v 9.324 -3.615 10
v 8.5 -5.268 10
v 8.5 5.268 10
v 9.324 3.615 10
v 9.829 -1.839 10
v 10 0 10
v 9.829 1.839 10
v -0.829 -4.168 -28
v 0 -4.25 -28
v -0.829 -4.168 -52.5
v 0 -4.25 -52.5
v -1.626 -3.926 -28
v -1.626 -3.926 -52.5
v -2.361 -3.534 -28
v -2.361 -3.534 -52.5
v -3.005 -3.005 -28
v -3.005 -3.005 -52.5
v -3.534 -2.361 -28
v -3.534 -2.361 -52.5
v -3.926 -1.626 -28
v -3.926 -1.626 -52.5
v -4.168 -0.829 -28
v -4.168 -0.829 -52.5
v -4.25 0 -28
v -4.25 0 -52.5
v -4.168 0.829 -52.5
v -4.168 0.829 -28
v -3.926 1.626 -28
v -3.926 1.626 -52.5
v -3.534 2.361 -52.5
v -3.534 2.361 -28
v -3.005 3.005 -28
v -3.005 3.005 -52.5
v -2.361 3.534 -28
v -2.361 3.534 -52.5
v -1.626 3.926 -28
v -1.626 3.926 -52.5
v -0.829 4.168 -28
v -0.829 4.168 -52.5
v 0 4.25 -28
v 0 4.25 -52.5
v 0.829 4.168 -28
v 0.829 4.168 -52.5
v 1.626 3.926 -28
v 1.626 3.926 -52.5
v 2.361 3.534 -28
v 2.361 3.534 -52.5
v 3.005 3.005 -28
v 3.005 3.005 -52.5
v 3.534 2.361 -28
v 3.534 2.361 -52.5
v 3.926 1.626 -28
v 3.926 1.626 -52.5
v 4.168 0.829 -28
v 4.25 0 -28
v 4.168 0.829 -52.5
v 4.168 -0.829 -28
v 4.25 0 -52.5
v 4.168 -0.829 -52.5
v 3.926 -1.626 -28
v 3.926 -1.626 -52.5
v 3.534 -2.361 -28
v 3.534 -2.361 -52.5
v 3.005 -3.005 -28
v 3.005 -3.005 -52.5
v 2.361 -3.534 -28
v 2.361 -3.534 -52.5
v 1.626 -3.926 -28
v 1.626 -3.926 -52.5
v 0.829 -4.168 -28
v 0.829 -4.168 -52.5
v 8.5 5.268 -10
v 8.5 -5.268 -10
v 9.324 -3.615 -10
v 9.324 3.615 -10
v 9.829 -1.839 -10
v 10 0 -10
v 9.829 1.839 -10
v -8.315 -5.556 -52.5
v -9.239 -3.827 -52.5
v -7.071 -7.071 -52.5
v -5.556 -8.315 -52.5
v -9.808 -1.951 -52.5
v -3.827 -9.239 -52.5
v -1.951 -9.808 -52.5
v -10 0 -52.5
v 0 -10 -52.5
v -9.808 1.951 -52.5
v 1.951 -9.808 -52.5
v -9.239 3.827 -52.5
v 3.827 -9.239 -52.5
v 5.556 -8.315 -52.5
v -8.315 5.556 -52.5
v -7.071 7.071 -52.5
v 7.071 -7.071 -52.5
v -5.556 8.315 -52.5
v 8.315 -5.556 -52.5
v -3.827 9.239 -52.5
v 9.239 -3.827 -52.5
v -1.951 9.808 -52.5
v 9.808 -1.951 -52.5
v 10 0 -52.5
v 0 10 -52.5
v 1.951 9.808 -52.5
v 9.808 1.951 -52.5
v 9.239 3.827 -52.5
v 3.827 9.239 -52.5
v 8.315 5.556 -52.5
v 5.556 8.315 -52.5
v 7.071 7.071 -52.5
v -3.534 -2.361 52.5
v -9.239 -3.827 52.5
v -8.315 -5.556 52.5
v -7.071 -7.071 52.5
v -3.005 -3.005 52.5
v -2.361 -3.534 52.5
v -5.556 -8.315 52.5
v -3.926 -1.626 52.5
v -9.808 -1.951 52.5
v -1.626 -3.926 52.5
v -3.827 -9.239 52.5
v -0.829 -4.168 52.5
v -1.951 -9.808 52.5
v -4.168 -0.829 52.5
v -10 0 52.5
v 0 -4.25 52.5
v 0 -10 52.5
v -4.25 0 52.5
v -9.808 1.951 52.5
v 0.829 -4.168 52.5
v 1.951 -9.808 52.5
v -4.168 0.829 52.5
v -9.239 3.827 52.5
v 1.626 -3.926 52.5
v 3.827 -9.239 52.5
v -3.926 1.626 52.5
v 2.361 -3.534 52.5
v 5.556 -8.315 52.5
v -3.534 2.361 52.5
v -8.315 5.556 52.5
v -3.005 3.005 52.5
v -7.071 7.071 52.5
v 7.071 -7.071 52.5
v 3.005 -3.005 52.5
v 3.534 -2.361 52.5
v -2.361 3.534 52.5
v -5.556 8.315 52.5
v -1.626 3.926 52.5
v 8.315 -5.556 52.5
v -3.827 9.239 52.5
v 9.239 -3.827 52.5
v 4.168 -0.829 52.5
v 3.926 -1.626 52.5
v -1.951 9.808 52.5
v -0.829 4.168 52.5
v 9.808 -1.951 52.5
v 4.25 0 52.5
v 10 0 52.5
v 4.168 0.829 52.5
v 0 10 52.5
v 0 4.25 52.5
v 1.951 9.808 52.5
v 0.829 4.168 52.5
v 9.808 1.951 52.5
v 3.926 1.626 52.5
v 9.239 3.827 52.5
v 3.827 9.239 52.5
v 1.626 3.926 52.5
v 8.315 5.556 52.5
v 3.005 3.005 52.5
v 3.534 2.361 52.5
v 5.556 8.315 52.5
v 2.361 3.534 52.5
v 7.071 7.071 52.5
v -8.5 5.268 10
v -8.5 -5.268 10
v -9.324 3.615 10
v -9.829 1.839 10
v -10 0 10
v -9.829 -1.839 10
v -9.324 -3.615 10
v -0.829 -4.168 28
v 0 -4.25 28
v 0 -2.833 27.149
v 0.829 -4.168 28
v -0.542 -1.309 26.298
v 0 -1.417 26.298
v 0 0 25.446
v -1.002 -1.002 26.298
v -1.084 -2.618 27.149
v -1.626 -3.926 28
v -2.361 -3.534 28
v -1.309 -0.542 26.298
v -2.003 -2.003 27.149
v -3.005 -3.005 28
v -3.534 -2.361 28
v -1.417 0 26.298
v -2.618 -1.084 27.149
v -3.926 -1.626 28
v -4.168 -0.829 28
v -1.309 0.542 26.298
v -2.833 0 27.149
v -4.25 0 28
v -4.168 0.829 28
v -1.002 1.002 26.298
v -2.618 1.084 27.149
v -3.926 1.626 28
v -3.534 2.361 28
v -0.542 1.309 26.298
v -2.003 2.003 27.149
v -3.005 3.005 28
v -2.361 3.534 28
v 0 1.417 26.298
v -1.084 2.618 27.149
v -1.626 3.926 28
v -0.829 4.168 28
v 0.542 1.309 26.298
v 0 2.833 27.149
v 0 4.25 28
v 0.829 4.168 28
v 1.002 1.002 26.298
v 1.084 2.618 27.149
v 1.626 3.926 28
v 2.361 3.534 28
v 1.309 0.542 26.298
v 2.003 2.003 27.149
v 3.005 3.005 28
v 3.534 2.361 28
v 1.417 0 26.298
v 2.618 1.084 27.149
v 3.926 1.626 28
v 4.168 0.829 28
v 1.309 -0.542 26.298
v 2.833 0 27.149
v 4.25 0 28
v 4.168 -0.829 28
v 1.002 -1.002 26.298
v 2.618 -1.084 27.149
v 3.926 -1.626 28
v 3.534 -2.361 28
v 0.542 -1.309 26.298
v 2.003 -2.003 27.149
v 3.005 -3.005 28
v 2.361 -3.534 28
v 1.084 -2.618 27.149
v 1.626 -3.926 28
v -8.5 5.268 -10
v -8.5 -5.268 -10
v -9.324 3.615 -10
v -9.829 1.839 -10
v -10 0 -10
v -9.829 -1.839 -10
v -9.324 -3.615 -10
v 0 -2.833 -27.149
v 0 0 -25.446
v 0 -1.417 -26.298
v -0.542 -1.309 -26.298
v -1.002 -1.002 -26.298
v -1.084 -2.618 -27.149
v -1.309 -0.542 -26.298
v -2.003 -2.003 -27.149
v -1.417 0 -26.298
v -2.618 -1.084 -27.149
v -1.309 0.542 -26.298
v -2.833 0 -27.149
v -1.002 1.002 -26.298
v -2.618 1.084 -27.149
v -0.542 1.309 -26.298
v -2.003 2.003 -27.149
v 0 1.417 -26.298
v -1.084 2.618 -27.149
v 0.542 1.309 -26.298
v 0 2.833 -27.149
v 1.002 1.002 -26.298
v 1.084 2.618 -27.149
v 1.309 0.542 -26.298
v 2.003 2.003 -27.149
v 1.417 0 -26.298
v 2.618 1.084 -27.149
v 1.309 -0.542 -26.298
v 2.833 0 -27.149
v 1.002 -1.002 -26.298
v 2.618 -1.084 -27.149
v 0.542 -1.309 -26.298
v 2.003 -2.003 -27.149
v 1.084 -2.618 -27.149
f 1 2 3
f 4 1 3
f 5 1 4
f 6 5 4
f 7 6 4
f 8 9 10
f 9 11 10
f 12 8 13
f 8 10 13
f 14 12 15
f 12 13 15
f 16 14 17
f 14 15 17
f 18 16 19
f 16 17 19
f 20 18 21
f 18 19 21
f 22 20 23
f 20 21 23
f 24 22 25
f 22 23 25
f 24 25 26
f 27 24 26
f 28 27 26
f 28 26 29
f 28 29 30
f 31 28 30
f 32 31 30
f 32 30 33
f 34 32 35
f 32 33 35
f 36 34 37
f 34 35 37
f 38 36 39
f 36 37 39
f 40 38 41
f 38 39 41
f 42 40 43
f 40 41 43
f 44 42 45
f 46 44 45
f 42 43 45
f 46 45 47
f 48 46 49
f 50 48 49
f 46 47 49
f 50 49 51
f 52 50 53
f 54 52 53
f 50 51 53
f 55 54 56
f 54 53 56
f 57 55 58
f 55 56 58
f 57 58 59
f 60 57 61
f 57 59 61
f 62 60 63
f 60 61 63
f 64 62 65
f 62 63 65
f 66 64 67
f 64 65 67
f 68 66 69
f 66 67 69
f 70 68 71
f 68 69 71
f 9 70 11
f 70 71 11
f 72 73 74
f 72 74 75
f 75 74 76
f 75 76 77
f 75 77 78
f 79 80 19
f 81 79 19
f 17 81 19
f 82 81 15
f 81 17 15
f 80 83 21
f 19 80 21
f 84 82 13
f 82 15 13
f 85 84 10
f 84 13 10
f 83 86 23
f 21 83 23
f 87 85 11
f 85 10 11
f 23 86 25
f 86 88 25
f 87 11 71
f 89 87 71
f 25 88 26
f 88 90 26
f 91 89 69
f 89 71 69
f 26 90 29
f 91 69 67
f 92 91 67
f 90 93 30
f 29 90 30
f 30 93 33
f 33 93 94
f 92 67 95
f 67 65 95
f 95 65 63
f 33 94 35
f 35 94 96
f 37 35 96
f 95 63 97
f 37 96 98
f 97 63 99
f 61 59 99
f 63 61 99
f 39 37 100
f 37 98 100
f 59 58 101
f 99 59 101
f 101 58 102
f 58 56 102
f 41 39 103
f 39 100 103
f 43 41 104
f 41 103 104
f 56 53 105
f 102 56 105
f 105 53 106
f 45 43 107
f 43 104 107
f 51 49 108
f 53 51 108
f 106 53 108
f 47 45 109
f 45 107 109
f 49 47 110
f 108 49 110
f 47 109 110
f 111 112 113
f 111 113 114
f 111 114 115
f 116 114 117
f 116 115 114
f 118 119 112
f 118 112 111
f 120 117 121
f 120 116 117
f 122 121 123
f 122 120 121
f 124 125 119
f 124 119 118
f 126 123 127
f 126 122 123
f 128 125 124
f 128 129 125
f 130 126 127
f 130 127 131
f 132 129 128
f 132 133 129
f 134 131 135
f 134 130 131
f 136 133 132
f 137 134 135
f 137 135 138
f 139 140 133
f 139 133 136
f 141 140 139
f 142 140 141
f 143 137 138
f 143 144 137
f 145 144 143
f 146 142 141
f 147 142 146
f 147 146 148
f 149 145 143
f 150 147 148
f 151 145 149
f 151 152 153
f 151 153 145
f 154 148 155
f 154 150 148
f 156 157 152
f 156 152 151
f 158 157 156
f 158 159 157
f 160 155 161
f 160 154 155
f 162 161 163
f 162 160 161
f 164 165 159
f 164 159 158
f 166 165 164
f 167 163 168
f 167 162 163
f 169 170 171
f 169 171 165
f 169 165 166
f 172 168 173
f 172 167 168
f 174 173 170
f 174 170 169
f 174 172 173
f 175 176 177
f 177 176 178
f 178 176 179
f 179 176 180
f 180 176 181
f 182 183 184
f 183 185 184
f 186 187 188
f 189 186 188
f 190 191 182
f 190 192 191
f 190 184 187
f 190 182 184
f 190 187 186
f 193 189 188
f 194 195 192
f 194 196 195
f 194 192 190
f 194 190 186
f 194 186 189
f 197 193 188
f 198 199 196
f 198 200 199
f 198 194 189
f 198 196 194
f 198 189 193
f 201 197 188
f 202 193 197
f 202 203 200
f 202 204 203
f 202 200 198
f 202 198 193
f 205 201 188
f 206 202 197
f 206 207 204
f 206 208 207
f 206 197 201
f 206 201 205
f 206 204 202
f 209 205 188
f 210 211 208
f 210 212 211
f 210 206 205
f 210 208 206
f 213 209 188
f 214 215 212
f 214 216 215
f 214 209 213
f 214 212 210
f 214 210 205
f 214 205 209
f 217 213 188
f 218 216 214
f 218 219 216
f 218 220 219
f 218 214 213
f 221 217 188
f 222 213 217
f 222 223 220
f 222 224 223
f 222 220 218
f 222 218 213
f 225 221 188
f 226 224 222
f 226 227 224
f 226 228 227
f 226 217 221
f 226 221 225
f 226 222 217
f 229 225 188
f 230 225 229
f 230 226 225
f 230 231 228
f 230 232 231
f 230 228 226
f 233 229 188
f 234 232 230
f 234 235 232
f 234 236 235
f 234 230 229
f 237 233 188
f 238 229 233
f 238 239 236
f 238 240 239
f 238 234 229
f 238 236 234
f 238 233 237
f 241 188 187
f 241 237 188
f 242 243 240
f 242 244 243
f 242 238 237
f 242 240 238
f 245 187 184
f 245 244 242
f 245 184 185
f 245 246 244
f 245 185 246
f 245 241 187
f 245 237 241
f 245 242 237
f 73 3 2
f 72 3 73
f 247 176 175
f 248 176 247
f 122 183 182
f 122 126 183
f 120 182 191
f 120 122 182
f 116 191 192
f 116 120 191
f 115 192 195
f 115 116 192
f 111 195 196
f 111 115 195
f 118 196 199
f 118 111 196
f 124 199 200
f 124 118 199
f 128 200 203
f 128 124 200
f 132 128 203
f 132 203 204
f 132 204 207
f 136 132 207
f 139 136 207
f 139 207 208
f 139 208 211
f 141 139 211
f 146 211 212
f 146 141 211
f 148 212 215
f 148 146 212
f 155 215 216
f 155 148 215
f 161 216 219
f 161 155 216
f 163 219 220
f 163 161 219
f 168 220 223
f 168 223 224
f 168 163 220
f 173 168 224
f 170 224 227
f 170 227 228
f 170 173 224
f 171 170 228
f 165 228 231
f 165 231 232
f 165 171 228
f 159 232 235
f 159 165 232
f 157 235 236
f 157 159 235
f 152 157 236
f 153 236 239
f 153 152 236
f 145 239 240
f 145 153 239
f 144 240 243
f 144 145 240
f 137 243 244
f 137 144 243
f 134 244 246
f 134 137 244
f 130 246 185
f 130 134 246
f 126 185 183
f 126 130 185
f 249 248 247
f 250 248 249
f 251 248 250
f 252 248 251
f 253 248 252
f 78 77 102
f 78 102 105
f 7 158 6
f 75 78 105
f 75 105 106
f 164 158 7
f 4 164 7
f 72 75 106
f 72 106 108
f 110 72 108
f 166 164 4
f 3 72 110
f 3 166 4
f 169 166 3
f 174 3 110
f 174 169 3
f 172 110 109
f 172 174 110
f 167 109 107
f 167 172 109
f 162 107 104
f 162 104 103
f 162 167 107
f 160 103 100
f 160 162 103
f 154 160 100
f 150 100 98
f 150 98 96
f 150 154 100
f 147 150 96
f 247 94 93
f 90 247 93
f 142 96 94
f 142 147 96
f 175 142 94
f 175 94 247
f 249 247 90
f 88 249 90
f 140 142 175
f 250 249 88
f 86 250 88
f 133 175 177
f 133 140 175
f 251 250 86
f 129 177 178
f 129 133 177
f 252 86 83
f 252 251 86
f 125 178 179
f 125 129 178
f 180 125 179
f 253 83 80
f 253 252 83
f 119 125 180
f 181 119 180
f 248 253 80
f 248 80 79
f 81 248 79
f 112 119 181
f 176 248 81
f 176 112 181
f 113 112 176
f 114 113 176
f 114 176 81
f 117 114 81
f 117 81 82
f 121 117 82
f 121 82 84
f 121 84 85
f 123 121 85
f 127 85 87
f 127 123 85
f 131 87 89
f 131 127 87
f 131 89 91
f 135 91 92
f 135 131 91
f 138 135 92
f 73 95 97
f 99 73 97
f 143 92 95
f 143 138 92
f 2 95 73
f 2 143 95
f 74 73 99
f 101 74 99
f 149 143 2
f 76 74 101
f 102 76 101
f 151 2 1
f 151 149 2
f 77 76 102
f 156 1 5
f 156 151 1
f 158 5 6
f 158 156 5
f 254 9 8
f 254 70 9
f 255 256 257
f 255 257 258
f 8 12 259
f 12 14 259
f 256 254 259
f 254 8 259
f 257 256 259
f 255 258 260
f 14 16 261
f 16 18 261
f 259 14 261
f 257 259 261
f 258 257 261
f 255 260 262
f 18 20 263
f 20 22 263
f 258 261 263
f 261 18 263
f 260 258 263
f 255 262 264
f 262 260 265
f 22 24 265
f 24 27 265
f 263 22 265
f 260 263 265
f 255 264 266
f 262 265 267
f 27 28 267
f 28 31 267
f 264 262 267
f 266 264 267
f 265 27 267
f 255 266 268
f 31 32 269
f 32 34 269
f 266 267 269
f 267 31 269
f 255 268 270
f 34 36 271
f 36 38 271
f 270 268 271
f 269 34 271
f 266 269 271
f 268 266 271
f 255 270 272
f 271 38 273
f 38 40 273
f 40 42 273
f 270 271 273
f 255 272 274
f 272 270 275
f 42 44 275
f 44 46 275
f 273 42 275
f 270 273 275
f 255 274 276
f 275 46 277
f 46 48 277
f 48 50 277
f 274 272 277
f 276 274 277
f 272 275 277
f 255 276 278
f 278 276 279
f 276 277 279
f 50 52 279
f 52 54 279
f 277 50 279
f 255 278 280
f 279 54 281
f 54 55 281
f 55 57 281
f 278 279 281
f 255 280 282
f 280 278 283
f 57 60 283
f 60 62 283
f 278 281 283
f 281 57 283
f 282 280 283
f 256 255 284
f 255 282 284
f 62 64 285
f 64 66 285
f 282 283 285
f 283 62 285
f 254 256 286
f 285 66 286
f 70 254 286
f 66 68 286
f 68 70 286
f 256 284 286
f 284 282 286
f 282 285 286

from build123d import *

# Parameters (mm, degrees)
SKETCH_1_R          = 10
EXTRUDE_1_DEPTH     = 52.5
SKETCH_2_W          = 3
SKETCH_2_H          = 20
CUT_EXTRUDE_1_DEPTH = 30


with BuildPart() as part:
    # 草图1 → 凸台-拉伸1 (new body, symmetric)
    with BuildSketch(Plane.XY):
        Circle(SKETCH_1_R)
    extrude(amount=EXTRUDE_1_DEPTH, both=True)

    # 草图2 → 切除-拉伸1 (cut, symmetric)
    with BuildSketch(Plane(origin=(0, 0, 0), x_dir=(1, 0, 0), z_dir=(0, 1, 0))):
        with Locations((-10, 0)):
            Rectangle(SKETCH_2_W, SKETCH_2_H)
        with Locations((10, 0)):
            Rectangle(SKETCH_2_W, SKETCH_2_H)
    extrude(amount=CUT_EXTRUDE_1_DEPTH, both=True, mode=Mode.SUBTRACT)

    # 草图4 → M10 螺纹孔1 (revolve, cut)
    with BuildSketch(Plane(origin=(0, 0, 52.5), x_dir=(0, -1, 0), z_dir=(1, 0, 0))):
        Polygon((0, 0), (0, 27.053657631), (4.25, 24.5), (4.25, 0), align=None)
    hole_wizard_m10_1 = revolve(axis=Axis((0, 0, 58.85), (0, 0, -1)), mode=Mode.SUBTRACT)

    # 镜向1: M10 螺纹孔1 across plane
    add(hole_wizard_m10_1.mirror(Plane.XY), mode=Mode.SUBTRACT)


solid = part.part
